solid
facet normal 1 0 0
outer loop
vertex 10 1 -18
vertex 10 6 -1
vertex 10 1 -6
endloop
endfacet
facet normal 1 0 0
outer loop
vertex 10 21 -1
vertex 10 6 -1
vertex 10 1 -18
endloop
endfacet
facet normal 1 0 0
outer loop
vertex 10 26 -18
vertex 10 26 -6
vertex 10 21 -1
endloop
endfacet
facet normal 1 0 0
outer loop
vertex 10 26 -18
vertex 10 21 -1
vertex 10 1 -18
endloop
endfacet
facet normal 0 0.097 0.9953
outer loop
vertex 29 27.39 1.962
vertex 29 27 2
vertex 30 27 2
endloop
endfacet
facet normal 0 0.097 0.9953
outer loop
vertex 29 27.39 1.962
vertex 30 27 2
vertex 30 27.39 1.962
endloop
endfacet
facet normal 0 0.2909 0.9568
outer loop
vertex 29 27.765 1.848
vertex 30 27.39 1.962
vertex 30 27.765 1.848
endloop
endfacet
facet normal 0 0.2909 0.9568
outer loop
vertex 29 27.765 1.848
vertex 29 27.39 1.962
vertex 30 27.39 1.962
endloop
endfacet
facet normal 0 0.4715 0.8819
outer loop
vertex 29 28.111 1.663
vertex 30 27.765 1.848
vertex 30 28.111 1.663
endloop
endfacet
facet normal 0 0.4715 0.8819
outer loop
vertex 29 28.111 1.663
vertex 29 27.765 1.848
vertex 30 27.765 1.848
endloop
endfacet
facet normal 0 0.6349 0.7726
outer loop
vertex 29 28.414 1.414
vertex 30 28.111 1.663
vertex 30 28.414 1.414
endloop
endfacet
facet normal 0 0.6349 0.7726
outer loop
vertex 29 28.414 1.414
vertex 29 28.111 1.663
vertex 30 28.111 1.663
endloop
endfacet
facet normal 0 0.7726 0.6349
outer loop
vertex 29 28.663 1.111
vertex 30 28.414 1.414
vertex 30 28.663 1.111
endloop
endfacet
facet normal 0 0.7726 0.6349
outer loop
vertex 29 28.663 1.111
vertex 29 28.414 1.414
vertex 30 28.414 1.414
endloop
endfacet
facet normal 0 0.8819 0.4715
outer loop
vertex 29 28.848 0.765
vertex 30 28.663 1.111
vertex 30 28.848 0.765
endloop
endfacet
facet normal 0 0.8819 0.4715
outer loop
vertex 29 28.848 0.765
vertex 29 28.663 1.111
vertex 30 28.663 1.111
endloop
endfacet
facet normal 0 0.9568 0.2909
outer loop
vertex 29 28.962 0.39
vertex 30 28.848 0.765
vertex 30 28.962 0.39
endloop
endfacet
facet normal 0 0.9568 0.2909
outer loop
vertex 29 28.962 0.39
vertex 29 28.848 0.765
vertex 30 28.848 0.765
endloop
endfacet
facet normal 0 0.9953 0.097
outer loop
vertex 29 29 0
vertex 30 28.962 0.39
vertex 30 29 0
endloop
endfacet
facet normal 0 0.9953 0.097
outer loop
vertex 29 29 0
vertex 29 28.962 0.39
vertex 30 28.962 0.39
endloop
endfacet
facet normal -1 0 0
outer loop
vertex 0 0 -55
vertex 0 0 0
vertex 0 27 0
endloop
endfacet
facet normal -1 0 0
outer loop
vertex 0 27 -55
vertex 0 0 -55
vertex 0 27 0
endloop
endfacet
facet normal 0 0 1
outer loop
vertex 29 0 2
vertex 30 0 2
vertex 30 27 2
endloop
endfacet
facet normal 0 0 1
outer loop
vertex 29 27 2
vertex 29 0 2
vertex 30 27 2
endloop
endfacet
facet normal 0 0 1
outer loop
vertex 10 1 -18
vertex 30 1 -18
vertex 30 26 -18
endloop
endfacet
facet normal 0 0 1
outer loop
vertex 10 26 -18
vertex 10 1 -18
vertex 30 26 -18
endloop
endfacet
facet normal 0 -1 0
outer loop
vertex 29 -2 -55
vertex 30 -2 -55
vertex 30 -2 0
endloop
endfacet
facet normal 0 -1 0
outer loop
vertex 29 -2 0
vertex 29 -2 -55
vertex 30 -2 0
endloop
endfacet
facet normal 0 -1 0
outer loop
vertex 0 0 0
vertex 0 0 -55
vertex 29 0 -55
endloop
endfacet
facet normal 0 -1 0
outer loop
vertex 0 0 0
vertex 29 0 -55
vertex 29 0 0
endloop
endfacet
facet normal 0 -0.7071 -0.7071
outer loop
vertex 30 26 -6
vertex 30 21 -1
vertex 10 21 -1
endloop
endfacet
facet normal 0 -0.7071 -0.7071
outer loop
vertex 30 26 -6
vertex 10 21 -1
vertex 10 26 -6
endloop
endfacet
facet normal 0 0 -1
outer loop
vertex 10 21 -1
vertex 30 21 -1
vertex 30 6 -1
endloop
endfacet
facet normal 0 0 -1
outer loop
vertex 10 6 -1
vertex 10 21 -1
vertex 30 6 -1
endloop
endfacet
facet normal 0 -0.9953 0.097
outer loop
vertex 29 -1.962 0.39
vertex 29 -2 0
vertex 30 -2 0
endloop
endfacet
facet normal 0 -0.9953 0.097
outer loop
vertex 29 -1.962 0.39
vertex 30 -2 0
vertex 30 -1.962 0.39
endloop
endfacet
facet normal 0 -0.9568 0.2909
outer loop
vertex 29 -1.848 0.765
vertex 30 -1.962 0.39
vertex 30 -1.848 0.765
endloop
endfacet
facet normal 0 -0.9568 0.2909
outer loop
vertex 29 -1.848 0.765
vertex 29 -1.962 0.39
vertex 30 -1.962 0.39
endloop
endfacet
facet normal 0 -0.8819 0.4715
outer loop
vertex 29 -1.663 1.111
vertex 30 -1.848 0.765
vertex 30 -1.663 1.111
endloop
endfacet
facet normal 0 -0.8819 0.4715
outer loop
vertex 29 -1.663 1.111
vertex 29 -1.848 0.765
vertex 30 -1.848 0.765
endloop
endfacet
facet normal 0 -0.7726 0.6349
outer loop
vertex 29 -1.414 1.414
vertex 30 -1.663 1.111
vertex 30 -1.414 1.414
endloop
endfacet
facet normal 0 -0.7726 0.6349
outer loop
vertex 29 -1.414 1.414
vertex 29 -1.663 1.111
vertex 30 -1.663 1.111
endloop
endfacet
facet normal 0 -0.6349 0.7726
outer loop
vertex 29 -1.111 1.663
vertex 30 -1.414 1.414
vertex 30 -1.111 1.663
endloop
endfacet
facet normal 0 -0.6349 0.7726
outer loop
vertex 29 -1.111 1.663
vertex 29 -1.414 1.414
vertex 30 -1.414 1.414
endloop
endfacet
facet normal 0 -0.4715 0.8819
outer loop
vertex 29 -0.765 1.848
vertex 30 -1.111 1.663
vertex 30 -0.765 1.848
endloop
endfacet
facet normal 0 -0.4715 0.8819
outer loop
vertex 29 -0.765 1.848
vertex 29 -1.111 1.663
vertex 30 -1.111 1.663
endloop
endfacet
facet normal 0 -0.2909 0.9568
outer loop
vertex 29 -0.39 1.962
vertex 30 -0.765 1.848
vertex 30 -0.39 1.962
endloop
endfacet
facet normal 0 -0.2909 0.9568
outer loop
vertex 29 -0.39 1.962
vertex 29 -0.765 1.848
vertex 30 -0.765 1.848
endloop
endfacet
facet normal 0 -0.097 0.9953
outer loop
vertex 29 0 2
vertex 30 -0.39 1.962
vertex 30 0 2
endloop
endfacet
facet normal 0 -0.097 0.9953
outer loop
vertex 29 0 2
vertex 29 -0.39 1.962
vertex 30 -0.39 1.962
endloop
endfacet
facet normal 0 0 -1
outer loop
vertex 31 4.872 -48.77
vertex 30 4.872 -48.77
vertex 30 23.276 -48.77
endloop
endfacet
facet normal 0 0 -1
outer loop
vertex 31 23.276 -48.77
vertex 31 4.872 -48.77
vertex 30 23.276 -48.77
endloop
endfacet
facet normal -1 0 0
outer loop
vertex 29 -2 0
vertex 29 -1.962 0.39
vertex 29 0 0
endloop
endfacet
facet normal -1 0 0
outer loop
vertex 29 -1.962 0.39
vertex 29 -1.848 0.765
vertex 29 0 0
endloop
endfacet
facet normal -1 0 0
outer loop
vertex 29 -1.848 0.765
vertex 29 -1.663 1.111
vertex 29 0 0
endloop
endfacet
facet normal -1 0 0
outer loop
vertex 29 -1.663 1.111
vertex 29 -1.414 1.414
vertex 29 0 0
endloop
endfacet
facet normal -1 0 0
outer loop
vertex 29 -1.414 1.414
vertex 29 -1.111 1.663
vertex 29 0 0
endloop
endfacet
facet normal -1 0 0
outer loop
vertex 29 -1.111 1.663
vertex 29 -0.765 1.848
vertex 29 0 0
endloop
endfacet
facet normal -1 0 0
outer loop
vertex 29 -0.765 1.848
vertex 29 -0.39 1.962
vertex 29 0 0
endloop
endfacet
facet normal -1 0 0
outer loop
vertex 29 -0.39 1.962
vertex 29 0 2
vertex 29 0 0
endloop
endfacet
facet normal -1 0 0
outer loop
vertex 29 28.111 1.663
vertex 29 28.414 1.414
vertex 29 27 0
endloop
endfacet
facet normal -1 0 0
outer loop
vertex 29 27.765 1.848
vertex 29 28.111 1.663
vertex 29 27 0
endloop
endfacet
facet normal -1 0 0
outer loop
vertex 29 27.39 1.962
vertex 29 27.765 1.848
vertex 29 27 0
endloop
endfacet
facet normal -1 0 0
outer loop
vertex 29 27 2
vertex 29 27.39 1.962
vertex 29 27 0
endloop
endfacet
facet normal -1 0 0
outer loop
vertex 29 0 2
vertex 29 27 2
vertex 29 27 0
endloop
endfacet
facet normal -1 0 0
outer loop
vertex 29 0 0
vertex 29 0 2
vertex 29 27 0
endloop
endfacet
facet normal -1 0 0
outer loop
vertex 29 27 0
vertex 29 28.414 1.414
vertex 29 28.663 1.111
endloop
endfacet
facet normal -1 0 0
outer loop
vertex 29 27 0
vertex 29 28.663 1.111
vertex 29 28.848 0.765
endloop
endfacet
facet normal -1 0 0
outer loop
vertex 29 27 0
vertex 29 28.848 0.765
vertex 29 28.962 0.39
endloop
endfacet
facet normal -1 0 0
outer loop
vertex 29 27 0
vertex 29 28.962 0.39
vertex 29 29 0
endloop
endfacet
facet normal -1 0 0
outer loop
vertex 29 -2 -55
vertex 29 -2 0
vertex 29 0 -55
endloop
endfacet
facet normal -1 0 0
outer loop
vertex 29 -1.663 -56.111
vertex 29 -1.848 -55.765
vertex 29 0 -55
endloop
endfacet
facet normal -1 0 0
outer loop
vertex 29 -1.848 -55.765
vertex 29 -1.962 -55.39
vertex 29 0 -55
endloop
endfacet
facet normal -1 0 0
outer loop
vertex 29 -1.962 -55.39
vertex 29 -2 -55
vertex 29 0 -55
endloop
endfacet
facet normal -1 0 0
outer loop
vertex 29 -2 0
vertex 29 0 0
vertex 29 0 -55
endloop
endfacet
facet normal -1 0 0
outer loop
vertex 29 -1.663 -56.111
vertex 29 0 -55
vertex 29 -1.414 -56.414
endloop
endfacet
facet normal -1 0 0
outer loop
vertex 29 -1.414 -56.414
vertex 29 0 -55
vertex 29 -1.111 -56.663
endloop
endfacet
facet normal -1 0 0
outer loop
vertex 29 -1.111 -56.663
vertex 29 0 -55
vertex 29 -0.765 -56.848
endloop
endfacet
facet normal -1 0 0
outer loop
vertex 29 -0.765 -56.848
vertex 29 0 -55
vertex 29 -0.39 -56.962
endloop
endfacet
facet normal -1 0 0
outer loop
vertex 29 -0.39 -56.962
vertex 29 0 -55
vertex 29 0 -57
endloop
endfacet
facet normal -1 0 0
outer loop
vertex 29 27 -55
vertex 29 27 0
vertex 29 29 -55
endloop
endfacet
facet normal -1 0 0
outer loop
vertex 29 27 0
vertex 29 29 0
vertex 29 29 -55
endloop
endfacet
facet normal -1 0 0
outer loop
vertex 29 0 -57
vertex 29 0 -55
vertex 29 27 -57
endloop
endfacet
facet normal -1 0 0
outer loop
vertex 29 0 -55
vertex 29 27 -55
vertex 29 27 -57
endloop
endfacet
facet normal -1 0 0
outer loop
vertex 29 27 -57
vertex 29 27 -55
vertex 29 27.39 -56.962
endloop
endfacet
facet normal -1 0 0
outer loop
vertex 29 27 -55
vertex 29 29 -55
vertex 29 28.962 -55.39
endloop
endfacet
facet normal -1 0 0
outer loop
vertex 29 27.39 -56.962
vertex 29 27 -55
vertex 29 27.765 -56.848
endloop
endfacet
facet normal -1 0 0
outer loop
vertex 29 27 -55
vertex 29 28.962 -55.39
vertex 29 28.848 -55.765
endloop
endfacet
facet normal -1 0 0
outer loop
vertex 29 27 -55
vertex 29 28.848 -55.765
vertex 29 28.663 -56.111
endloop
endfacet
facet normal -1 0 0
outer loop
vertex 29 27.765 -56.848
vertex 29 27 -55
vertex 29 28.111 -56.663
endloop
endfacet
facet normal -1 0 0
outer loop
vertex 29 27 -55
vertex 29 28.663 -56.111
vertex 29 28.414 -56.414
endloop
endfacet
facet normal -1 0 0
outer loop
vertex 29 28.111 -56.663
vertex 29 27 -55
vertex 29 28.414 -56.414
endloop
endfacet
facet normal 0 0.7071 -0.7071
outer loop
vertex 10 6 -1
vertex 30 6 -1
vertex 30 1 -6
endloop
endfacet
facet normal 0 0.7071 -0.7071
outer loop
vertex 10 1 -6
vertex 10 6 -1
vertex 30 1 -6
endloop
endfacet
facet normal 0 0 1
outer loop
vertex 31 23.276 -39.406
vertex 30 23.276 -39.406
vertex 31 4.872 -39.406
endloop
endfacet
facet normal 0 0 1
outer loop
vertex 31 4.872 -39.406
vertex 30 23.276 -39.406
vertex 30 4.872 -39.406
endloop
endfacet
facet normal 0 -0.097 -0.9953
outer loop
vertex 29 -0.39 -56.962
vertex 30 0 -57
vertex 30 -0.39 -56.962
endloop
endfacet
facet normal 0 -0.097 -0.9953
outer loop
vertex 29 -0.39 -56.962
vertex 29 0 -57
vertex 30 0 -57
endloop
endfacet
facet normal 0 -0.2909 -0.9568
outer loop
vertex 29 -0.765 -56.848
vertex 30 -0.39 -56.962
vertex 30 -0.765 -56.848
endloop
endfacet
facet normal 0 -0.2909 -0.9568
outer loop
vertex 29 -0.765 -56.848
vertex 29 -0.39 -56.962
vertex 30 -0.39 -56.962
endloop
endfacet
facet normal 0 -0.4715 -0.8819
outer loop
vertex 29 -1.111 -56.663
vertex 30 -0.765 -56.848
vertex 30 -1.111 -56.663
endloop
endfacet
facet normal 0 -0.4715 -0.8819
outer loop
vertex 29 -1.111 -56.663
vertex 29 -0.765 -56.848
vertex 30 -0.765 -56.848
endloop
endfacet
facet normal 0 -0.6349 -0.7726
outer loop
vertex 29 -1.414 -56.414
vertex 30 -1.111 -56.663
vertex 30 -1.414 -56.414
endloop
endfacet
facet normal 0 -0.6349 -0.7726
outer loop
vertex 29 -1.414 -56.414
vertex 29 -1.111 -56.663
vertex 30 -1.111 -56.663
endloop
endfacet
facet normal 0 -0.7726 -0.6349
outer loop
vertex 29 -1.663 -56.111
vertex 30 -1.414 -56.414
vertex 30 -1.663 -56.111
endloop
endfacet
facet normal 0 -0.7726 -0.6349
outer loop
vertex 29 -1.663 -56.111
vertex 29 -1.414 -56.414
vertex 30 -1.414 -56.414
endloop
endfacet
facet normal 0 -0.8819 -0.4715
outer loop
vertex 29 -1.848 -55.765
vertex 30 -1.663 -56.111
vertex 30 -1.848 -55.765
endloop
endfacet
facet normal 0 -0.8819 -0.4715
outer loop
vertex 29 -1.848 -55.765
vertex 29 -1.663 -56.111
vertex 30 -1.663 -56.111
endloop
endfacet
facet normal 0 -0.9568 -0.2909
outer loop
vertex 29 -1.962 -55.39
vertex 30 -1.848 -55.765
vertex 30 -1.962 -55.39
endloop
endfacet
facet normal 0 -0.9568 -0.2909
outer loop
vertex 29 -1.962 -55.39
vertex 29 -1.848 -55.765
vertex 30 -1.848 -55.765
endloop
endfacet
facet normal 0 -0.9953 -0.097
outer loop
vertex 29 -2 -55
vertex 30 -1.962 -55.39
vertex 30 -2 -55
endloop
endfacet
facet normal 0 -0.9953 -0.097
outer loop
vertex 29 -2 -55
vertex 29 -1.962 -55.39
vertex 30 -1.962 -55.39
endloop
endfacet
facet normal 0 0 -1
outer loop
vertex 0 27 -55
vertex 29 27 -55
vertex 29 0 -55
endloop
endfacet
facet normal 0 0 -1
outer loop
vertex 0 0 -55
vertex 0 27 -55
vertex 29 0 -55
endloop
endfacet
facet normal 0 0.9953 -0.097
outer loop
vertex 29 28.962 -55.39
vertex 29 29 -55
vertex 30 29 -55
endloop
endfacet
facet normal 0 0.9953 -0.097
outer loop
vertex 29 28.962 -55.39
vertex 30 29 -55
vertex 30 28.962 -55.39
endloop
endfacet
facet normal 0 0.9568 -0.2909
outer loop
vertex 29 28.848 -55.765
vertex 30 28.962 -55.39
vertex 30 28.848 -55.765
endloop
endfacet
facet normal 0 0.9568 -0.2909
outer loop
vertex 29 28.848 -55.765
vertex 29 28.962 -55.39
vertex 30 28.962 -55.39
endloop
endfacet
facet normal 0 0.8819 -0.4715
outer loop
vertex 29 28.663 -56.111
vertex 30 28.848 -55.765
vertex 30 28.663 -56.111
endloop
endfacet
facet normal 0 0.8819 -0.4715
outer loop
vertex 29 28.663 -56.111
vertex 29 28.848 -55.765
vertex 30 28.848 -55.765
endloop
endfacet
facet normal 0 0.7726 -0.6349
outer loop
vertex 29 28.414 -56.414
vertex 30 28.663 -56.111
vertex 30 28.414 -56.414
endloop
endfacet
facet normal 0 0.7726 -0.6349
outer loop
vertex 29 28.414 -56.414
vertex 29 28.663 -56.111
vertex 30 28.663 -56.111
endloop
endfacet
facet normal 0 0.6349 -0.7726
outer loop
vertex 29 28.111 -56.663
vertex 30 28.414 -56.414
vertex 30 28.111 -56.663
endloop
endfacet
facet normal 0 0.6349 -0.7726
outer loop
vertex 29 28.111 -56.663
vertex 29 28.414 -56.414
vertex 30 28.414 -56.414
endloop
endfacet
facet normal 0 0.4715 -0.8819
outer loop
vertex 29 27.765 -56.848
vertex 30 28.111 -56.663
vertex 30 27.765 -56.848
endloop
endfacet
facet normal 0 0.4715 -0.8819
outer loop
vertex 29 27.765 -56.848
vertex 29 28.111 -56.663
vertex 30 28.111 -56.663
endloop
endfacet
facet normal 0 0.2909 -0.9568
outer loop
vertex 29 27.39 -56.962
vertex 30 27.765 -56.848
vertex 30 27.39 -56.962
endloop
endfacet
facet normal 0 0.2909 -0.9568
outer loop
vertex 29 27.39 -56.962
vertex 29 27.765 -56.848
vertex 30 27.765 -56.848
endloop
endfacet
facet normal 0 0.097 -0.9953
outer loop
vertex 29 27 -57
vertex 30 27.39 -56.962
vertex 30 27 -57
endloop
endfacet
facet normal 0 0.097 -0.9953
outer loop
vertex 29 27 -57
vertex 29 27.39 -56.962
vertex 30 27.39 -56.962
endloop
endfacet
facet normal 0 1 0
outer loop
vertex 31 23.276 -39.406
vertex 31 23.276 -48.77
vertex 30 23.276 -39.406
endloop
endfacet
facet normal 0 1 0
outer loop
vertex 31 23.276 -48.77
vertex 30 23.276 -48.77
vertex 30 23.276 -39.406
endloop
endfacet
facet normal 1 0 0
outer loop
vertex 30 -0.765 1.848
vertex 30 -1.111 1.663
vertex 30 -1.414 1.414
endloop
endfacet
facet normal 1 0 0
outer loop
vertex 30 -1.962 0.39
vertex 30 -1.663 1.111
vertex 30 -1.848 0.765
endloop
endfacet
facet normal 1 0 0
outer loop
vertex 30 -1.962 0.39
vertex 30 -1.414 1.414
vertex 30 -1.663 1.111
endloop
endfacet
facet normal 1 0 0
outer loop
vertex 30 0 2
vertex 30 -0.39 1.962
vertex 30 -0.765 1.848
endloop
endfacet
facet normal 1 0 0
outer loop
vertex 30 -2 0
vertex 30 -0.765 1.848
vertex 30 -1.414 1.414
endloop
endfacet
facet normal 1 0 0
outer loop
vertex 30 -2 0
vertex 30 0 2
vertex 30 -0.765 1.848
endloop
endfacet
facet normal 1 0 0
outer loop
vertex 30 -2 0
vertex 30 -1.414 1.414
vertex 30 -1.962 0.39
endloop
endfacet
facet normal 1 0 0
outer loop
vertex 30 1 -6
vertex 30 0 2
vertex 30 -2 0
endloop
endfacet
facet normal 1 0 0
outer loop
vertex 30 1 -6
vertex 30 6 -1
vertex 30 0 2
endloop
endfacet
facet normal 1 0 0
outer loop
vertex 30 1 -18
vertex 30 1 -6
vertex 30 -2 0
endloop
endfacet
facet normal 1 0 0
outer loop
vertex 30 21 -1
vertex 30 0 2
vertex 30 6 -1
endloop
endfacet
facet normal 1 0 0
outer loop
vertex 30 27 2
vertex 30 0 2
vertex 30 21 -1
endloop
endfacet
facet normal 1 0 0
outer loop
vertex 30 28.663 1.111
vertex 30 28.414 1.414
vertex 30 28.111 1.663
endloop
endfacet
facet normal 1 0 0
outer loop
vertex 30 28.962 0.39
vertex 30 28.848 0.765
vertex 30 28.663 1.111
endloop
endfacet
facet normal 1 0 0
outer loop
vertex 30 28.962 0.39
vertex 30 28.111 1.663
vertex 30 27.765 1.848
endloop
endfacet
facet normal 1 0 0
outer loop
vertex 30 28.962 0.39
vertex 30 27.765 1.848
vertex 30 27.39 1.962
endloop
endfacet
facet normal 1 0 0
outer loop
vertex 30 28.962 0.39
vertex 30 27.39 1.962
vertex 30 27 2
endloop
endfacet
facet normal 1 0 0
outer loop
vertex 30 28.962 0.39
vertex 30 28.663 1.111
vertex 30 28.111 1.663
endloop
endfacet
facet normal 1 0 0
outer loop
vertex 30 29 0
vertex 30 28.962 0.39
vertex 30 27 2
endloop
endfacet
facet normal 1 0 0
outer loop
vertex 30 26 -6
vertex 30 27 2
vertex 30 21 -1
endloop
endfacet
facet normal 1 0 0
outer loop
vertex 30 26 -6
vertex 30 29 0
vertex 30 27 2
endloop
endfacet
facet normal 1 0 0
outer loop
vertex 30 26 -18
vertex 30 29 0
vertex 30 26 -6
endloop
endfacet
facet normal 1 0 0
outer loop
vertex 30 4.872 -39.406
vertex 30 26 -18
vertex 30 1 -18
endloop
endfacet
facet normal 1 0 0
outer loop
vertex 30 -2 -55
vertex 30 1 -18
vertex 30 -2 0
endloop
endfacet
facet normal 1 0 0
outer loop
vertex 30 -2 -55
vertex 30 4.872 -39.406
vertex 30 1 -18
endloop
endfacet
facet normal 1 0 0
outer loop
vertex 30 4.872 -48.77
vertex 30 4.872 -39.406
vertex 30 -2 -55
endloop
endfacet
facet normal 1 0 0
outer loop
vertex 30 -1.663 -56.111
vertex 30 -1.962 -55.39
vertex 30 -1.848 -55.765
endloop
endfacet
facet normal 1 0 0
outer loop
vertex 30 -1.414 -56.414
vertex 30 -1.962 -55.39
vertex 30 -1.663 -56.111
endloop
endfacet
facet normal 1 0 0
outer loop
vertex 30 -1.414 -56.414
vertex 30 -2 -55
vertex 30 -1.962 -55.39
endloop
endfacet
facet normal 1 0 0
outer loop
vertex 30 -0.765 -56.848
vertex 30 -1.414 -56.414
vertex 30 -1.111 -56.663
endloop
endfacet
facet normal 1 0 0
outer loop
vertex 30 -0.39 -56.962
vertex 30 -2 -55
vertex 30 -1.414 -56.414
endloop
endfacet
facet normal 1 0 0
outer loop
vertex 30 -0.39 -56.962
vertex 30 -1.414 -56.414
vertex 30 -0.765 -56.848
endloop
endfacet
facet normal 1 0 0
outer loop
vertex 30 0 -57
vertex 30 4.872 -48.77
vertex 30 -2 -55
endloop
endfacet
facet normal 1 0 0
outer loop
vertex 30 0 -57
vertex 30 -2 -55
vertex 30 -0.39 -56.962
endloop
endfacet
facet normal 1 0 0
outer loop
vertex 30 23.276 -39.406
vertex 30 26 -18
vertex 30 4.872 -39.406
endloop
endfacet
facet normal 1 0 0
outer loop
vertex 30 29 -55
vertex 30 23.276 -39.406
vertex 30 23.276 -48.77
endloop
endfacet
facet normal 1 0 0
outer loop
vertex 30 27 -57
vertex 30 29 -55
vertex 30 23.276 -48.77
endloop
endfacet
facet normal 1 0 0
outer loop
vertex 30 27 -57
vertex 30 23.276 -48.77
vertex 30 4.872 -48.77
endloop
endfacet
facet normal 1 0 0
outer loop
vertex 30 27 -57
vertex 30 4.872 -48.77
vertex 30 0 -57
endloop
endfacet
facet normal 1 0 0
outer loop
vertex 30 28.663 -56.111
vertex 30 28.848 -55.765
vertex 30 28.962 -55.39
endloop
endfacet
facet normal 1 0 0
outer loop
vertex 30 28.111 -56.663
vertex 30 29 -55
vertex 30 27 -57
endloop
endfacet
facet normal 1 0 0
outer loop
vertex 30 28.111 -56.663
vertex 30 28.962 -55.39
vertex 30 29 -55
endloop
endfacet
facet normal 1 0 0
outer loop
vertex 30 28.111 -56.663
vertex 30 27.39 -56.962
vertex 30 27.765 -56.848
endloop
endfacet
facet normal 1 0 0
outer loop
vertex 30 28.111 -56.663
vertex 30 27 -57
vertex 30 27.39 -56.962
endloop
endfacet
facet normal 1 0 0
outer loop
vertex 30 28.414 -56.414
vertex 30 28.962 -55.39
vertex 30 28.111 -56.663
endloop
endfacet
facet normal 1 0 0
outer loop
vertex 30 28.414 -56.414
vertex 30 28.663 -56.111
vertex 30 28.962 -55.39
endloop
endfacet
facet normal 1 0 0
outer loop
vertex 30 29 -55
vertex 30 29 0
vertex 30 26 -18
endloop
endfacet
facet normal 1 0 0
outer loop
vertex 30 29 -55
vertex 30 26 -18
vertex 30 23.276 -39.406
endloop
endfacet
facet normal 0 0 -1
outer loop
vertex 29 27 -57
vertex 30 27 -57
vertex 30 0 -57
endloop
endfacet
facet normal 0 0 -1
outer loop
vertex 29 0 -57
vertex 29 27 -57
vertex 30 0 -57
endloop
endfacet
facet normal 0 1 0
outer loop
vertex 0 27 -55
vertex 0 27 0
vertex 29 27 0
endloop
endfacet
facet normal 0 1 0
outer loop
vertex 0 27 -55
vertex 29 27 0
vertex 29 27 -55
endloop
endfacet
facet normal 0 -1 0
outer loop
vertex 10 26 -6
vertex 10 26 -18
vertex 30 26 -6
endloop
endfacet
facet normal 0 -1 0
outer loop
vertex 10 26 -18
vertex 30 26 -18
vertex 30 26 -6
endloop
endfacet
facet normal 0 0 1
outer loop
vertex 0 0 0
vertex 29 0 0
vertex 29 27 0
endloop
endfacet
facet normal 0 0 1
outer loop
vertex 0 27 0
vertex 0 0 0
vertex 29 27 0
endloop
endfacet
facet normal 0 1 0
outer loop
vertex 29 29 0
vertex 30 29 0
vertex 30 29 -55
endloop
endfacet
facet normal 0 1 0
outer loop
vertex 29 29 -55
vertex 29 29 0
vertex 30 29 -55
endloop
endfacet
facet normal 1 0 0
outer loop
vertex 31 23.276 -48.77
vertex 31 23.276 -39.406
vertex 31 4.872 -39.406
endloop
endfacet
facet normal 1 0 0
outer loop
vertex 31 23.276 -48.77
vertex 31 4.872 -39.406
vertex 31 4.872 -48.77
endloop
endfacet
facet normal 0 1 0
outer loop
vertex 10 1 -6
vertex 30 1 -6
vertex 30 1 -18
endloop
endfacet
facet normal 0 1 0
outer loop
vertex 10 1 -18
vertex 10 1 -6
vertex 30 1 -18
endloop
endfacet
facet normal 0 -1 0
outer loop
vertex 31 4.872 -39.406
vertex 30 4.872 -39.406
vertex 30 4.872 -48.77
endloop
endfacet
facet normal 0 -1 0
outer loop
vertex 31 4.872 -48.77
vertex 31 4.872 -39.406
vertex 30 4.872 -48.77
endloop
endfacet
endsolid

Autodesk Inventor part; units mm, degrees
ref_plane "YZ Plane" through (0, 0, 0) normal (1, 0, 0) x (0, 1, 0)
ref_plane "XZ Plane" through (0, 0, 0) normal (0, 1, 0) x (-1, 0, 0)
ref_plane "XY Plane" through (0, 0, 0) normal (0, 0, 1) x (1, 0, 0)
sketch "Sketch1" plane through (0, 0, 0) normal (1, 0, 0) x (0, 1, 0)
  line L0 (0, 0) -> (27, 0)
  line L1 (27, 0) -> (27, -55)
  line L2 (27, -55) -> (0, -55)
  line L3 (0, -55) -> (0, 0)
  dimension "d0" = 27
  dimension "d1" = 55
extrude "Extrusion1" add sketch "Sketch1" along normal blind 30
sketch "Sketch2" plane through (30, 0, 0) normal (1, 0, 0) x (0, 0, -1)
  line L0 (-2, 29) -> (57, 29)
  line L1 (57, 29) -> (57, -2)
  line L2 (57, -2) -> (-2, -2)
  line L3 (-2, -2) -> (-2, 29)
  line L4 (0, 27) -> (0, 0) projected
  line L5 (55, 27) -> (0, 27) projected
  line L6 (0, 0) -> (55, 0) projected
  line L7 (55, 0) -> (55, 27) projected
  dimension "d4" = 2
  dimension "d5" = 2
  dimension "d6" = 2
  dimension "d7" = 2
extrude "Extrusion2" add sketch "Sketch2" against normal blind 1
fillet "Fillet1" radius 2 4 edges at (29.5, 29, 2) (29.5, 29, -57) (29.5, -2, -57) (29.5, -2, 2)
sketch "Sketch3" plane through (30, 0, 0) normal (1, 0, 0) x (0, 0, -1)
  line L0 (6, 1) -> (18, 1)
  line L1 (18, 1) -> (18, 26)
  line L2 (18, 26) -> (6, 26)
  line L3 (1, 26) -> (1, 1)
  line L4 (0, 29) -> (55, 29) projected
  line L5 (55, -2) -> (0, -2) projected
  line L6 (1, 21) -> (6, 26)
  line L7 (1, 6) -> (6, 1)
  line L8 (-2, 0) -> (-2, 27) projected
  point P0 (0, 0)
  dimension "d11" = 17
  dimension "d12" = 25
  dimension "d13" = 31
  dimension "d14" = 3
  dimension "d15" = 3
  dimension "d16" = 5
  dimension "d17" = 5
  dimension "d18" = 5
  dimension "d19" = 5
extrude "Extrusion3" cut sketch "Sketch3" against normal blind 20
sketch "Sketch4" plane through (30, 0, 0) normal (1, 0, 0) x (0, 0, -1)
  line L0 (48.7705, 23.2756) -> (39.4061, 23.2756)
  line L1 (39.4061, 23.2756) -> (39.4061, 4.8716)
  line L2 (39.4061, 4.8716) -> (48.7705, 4.8716)
  line L3 (48.7705, 4.8716) -> (48.7705, 23.2756)
  point P0 (0, 0)
extrude "Extrusion4" add sketch "Sketch4" along normal blind 1
equation "\"d14\" = -0.5 * d12 + 0.5 * d13"
properties part number "power"
